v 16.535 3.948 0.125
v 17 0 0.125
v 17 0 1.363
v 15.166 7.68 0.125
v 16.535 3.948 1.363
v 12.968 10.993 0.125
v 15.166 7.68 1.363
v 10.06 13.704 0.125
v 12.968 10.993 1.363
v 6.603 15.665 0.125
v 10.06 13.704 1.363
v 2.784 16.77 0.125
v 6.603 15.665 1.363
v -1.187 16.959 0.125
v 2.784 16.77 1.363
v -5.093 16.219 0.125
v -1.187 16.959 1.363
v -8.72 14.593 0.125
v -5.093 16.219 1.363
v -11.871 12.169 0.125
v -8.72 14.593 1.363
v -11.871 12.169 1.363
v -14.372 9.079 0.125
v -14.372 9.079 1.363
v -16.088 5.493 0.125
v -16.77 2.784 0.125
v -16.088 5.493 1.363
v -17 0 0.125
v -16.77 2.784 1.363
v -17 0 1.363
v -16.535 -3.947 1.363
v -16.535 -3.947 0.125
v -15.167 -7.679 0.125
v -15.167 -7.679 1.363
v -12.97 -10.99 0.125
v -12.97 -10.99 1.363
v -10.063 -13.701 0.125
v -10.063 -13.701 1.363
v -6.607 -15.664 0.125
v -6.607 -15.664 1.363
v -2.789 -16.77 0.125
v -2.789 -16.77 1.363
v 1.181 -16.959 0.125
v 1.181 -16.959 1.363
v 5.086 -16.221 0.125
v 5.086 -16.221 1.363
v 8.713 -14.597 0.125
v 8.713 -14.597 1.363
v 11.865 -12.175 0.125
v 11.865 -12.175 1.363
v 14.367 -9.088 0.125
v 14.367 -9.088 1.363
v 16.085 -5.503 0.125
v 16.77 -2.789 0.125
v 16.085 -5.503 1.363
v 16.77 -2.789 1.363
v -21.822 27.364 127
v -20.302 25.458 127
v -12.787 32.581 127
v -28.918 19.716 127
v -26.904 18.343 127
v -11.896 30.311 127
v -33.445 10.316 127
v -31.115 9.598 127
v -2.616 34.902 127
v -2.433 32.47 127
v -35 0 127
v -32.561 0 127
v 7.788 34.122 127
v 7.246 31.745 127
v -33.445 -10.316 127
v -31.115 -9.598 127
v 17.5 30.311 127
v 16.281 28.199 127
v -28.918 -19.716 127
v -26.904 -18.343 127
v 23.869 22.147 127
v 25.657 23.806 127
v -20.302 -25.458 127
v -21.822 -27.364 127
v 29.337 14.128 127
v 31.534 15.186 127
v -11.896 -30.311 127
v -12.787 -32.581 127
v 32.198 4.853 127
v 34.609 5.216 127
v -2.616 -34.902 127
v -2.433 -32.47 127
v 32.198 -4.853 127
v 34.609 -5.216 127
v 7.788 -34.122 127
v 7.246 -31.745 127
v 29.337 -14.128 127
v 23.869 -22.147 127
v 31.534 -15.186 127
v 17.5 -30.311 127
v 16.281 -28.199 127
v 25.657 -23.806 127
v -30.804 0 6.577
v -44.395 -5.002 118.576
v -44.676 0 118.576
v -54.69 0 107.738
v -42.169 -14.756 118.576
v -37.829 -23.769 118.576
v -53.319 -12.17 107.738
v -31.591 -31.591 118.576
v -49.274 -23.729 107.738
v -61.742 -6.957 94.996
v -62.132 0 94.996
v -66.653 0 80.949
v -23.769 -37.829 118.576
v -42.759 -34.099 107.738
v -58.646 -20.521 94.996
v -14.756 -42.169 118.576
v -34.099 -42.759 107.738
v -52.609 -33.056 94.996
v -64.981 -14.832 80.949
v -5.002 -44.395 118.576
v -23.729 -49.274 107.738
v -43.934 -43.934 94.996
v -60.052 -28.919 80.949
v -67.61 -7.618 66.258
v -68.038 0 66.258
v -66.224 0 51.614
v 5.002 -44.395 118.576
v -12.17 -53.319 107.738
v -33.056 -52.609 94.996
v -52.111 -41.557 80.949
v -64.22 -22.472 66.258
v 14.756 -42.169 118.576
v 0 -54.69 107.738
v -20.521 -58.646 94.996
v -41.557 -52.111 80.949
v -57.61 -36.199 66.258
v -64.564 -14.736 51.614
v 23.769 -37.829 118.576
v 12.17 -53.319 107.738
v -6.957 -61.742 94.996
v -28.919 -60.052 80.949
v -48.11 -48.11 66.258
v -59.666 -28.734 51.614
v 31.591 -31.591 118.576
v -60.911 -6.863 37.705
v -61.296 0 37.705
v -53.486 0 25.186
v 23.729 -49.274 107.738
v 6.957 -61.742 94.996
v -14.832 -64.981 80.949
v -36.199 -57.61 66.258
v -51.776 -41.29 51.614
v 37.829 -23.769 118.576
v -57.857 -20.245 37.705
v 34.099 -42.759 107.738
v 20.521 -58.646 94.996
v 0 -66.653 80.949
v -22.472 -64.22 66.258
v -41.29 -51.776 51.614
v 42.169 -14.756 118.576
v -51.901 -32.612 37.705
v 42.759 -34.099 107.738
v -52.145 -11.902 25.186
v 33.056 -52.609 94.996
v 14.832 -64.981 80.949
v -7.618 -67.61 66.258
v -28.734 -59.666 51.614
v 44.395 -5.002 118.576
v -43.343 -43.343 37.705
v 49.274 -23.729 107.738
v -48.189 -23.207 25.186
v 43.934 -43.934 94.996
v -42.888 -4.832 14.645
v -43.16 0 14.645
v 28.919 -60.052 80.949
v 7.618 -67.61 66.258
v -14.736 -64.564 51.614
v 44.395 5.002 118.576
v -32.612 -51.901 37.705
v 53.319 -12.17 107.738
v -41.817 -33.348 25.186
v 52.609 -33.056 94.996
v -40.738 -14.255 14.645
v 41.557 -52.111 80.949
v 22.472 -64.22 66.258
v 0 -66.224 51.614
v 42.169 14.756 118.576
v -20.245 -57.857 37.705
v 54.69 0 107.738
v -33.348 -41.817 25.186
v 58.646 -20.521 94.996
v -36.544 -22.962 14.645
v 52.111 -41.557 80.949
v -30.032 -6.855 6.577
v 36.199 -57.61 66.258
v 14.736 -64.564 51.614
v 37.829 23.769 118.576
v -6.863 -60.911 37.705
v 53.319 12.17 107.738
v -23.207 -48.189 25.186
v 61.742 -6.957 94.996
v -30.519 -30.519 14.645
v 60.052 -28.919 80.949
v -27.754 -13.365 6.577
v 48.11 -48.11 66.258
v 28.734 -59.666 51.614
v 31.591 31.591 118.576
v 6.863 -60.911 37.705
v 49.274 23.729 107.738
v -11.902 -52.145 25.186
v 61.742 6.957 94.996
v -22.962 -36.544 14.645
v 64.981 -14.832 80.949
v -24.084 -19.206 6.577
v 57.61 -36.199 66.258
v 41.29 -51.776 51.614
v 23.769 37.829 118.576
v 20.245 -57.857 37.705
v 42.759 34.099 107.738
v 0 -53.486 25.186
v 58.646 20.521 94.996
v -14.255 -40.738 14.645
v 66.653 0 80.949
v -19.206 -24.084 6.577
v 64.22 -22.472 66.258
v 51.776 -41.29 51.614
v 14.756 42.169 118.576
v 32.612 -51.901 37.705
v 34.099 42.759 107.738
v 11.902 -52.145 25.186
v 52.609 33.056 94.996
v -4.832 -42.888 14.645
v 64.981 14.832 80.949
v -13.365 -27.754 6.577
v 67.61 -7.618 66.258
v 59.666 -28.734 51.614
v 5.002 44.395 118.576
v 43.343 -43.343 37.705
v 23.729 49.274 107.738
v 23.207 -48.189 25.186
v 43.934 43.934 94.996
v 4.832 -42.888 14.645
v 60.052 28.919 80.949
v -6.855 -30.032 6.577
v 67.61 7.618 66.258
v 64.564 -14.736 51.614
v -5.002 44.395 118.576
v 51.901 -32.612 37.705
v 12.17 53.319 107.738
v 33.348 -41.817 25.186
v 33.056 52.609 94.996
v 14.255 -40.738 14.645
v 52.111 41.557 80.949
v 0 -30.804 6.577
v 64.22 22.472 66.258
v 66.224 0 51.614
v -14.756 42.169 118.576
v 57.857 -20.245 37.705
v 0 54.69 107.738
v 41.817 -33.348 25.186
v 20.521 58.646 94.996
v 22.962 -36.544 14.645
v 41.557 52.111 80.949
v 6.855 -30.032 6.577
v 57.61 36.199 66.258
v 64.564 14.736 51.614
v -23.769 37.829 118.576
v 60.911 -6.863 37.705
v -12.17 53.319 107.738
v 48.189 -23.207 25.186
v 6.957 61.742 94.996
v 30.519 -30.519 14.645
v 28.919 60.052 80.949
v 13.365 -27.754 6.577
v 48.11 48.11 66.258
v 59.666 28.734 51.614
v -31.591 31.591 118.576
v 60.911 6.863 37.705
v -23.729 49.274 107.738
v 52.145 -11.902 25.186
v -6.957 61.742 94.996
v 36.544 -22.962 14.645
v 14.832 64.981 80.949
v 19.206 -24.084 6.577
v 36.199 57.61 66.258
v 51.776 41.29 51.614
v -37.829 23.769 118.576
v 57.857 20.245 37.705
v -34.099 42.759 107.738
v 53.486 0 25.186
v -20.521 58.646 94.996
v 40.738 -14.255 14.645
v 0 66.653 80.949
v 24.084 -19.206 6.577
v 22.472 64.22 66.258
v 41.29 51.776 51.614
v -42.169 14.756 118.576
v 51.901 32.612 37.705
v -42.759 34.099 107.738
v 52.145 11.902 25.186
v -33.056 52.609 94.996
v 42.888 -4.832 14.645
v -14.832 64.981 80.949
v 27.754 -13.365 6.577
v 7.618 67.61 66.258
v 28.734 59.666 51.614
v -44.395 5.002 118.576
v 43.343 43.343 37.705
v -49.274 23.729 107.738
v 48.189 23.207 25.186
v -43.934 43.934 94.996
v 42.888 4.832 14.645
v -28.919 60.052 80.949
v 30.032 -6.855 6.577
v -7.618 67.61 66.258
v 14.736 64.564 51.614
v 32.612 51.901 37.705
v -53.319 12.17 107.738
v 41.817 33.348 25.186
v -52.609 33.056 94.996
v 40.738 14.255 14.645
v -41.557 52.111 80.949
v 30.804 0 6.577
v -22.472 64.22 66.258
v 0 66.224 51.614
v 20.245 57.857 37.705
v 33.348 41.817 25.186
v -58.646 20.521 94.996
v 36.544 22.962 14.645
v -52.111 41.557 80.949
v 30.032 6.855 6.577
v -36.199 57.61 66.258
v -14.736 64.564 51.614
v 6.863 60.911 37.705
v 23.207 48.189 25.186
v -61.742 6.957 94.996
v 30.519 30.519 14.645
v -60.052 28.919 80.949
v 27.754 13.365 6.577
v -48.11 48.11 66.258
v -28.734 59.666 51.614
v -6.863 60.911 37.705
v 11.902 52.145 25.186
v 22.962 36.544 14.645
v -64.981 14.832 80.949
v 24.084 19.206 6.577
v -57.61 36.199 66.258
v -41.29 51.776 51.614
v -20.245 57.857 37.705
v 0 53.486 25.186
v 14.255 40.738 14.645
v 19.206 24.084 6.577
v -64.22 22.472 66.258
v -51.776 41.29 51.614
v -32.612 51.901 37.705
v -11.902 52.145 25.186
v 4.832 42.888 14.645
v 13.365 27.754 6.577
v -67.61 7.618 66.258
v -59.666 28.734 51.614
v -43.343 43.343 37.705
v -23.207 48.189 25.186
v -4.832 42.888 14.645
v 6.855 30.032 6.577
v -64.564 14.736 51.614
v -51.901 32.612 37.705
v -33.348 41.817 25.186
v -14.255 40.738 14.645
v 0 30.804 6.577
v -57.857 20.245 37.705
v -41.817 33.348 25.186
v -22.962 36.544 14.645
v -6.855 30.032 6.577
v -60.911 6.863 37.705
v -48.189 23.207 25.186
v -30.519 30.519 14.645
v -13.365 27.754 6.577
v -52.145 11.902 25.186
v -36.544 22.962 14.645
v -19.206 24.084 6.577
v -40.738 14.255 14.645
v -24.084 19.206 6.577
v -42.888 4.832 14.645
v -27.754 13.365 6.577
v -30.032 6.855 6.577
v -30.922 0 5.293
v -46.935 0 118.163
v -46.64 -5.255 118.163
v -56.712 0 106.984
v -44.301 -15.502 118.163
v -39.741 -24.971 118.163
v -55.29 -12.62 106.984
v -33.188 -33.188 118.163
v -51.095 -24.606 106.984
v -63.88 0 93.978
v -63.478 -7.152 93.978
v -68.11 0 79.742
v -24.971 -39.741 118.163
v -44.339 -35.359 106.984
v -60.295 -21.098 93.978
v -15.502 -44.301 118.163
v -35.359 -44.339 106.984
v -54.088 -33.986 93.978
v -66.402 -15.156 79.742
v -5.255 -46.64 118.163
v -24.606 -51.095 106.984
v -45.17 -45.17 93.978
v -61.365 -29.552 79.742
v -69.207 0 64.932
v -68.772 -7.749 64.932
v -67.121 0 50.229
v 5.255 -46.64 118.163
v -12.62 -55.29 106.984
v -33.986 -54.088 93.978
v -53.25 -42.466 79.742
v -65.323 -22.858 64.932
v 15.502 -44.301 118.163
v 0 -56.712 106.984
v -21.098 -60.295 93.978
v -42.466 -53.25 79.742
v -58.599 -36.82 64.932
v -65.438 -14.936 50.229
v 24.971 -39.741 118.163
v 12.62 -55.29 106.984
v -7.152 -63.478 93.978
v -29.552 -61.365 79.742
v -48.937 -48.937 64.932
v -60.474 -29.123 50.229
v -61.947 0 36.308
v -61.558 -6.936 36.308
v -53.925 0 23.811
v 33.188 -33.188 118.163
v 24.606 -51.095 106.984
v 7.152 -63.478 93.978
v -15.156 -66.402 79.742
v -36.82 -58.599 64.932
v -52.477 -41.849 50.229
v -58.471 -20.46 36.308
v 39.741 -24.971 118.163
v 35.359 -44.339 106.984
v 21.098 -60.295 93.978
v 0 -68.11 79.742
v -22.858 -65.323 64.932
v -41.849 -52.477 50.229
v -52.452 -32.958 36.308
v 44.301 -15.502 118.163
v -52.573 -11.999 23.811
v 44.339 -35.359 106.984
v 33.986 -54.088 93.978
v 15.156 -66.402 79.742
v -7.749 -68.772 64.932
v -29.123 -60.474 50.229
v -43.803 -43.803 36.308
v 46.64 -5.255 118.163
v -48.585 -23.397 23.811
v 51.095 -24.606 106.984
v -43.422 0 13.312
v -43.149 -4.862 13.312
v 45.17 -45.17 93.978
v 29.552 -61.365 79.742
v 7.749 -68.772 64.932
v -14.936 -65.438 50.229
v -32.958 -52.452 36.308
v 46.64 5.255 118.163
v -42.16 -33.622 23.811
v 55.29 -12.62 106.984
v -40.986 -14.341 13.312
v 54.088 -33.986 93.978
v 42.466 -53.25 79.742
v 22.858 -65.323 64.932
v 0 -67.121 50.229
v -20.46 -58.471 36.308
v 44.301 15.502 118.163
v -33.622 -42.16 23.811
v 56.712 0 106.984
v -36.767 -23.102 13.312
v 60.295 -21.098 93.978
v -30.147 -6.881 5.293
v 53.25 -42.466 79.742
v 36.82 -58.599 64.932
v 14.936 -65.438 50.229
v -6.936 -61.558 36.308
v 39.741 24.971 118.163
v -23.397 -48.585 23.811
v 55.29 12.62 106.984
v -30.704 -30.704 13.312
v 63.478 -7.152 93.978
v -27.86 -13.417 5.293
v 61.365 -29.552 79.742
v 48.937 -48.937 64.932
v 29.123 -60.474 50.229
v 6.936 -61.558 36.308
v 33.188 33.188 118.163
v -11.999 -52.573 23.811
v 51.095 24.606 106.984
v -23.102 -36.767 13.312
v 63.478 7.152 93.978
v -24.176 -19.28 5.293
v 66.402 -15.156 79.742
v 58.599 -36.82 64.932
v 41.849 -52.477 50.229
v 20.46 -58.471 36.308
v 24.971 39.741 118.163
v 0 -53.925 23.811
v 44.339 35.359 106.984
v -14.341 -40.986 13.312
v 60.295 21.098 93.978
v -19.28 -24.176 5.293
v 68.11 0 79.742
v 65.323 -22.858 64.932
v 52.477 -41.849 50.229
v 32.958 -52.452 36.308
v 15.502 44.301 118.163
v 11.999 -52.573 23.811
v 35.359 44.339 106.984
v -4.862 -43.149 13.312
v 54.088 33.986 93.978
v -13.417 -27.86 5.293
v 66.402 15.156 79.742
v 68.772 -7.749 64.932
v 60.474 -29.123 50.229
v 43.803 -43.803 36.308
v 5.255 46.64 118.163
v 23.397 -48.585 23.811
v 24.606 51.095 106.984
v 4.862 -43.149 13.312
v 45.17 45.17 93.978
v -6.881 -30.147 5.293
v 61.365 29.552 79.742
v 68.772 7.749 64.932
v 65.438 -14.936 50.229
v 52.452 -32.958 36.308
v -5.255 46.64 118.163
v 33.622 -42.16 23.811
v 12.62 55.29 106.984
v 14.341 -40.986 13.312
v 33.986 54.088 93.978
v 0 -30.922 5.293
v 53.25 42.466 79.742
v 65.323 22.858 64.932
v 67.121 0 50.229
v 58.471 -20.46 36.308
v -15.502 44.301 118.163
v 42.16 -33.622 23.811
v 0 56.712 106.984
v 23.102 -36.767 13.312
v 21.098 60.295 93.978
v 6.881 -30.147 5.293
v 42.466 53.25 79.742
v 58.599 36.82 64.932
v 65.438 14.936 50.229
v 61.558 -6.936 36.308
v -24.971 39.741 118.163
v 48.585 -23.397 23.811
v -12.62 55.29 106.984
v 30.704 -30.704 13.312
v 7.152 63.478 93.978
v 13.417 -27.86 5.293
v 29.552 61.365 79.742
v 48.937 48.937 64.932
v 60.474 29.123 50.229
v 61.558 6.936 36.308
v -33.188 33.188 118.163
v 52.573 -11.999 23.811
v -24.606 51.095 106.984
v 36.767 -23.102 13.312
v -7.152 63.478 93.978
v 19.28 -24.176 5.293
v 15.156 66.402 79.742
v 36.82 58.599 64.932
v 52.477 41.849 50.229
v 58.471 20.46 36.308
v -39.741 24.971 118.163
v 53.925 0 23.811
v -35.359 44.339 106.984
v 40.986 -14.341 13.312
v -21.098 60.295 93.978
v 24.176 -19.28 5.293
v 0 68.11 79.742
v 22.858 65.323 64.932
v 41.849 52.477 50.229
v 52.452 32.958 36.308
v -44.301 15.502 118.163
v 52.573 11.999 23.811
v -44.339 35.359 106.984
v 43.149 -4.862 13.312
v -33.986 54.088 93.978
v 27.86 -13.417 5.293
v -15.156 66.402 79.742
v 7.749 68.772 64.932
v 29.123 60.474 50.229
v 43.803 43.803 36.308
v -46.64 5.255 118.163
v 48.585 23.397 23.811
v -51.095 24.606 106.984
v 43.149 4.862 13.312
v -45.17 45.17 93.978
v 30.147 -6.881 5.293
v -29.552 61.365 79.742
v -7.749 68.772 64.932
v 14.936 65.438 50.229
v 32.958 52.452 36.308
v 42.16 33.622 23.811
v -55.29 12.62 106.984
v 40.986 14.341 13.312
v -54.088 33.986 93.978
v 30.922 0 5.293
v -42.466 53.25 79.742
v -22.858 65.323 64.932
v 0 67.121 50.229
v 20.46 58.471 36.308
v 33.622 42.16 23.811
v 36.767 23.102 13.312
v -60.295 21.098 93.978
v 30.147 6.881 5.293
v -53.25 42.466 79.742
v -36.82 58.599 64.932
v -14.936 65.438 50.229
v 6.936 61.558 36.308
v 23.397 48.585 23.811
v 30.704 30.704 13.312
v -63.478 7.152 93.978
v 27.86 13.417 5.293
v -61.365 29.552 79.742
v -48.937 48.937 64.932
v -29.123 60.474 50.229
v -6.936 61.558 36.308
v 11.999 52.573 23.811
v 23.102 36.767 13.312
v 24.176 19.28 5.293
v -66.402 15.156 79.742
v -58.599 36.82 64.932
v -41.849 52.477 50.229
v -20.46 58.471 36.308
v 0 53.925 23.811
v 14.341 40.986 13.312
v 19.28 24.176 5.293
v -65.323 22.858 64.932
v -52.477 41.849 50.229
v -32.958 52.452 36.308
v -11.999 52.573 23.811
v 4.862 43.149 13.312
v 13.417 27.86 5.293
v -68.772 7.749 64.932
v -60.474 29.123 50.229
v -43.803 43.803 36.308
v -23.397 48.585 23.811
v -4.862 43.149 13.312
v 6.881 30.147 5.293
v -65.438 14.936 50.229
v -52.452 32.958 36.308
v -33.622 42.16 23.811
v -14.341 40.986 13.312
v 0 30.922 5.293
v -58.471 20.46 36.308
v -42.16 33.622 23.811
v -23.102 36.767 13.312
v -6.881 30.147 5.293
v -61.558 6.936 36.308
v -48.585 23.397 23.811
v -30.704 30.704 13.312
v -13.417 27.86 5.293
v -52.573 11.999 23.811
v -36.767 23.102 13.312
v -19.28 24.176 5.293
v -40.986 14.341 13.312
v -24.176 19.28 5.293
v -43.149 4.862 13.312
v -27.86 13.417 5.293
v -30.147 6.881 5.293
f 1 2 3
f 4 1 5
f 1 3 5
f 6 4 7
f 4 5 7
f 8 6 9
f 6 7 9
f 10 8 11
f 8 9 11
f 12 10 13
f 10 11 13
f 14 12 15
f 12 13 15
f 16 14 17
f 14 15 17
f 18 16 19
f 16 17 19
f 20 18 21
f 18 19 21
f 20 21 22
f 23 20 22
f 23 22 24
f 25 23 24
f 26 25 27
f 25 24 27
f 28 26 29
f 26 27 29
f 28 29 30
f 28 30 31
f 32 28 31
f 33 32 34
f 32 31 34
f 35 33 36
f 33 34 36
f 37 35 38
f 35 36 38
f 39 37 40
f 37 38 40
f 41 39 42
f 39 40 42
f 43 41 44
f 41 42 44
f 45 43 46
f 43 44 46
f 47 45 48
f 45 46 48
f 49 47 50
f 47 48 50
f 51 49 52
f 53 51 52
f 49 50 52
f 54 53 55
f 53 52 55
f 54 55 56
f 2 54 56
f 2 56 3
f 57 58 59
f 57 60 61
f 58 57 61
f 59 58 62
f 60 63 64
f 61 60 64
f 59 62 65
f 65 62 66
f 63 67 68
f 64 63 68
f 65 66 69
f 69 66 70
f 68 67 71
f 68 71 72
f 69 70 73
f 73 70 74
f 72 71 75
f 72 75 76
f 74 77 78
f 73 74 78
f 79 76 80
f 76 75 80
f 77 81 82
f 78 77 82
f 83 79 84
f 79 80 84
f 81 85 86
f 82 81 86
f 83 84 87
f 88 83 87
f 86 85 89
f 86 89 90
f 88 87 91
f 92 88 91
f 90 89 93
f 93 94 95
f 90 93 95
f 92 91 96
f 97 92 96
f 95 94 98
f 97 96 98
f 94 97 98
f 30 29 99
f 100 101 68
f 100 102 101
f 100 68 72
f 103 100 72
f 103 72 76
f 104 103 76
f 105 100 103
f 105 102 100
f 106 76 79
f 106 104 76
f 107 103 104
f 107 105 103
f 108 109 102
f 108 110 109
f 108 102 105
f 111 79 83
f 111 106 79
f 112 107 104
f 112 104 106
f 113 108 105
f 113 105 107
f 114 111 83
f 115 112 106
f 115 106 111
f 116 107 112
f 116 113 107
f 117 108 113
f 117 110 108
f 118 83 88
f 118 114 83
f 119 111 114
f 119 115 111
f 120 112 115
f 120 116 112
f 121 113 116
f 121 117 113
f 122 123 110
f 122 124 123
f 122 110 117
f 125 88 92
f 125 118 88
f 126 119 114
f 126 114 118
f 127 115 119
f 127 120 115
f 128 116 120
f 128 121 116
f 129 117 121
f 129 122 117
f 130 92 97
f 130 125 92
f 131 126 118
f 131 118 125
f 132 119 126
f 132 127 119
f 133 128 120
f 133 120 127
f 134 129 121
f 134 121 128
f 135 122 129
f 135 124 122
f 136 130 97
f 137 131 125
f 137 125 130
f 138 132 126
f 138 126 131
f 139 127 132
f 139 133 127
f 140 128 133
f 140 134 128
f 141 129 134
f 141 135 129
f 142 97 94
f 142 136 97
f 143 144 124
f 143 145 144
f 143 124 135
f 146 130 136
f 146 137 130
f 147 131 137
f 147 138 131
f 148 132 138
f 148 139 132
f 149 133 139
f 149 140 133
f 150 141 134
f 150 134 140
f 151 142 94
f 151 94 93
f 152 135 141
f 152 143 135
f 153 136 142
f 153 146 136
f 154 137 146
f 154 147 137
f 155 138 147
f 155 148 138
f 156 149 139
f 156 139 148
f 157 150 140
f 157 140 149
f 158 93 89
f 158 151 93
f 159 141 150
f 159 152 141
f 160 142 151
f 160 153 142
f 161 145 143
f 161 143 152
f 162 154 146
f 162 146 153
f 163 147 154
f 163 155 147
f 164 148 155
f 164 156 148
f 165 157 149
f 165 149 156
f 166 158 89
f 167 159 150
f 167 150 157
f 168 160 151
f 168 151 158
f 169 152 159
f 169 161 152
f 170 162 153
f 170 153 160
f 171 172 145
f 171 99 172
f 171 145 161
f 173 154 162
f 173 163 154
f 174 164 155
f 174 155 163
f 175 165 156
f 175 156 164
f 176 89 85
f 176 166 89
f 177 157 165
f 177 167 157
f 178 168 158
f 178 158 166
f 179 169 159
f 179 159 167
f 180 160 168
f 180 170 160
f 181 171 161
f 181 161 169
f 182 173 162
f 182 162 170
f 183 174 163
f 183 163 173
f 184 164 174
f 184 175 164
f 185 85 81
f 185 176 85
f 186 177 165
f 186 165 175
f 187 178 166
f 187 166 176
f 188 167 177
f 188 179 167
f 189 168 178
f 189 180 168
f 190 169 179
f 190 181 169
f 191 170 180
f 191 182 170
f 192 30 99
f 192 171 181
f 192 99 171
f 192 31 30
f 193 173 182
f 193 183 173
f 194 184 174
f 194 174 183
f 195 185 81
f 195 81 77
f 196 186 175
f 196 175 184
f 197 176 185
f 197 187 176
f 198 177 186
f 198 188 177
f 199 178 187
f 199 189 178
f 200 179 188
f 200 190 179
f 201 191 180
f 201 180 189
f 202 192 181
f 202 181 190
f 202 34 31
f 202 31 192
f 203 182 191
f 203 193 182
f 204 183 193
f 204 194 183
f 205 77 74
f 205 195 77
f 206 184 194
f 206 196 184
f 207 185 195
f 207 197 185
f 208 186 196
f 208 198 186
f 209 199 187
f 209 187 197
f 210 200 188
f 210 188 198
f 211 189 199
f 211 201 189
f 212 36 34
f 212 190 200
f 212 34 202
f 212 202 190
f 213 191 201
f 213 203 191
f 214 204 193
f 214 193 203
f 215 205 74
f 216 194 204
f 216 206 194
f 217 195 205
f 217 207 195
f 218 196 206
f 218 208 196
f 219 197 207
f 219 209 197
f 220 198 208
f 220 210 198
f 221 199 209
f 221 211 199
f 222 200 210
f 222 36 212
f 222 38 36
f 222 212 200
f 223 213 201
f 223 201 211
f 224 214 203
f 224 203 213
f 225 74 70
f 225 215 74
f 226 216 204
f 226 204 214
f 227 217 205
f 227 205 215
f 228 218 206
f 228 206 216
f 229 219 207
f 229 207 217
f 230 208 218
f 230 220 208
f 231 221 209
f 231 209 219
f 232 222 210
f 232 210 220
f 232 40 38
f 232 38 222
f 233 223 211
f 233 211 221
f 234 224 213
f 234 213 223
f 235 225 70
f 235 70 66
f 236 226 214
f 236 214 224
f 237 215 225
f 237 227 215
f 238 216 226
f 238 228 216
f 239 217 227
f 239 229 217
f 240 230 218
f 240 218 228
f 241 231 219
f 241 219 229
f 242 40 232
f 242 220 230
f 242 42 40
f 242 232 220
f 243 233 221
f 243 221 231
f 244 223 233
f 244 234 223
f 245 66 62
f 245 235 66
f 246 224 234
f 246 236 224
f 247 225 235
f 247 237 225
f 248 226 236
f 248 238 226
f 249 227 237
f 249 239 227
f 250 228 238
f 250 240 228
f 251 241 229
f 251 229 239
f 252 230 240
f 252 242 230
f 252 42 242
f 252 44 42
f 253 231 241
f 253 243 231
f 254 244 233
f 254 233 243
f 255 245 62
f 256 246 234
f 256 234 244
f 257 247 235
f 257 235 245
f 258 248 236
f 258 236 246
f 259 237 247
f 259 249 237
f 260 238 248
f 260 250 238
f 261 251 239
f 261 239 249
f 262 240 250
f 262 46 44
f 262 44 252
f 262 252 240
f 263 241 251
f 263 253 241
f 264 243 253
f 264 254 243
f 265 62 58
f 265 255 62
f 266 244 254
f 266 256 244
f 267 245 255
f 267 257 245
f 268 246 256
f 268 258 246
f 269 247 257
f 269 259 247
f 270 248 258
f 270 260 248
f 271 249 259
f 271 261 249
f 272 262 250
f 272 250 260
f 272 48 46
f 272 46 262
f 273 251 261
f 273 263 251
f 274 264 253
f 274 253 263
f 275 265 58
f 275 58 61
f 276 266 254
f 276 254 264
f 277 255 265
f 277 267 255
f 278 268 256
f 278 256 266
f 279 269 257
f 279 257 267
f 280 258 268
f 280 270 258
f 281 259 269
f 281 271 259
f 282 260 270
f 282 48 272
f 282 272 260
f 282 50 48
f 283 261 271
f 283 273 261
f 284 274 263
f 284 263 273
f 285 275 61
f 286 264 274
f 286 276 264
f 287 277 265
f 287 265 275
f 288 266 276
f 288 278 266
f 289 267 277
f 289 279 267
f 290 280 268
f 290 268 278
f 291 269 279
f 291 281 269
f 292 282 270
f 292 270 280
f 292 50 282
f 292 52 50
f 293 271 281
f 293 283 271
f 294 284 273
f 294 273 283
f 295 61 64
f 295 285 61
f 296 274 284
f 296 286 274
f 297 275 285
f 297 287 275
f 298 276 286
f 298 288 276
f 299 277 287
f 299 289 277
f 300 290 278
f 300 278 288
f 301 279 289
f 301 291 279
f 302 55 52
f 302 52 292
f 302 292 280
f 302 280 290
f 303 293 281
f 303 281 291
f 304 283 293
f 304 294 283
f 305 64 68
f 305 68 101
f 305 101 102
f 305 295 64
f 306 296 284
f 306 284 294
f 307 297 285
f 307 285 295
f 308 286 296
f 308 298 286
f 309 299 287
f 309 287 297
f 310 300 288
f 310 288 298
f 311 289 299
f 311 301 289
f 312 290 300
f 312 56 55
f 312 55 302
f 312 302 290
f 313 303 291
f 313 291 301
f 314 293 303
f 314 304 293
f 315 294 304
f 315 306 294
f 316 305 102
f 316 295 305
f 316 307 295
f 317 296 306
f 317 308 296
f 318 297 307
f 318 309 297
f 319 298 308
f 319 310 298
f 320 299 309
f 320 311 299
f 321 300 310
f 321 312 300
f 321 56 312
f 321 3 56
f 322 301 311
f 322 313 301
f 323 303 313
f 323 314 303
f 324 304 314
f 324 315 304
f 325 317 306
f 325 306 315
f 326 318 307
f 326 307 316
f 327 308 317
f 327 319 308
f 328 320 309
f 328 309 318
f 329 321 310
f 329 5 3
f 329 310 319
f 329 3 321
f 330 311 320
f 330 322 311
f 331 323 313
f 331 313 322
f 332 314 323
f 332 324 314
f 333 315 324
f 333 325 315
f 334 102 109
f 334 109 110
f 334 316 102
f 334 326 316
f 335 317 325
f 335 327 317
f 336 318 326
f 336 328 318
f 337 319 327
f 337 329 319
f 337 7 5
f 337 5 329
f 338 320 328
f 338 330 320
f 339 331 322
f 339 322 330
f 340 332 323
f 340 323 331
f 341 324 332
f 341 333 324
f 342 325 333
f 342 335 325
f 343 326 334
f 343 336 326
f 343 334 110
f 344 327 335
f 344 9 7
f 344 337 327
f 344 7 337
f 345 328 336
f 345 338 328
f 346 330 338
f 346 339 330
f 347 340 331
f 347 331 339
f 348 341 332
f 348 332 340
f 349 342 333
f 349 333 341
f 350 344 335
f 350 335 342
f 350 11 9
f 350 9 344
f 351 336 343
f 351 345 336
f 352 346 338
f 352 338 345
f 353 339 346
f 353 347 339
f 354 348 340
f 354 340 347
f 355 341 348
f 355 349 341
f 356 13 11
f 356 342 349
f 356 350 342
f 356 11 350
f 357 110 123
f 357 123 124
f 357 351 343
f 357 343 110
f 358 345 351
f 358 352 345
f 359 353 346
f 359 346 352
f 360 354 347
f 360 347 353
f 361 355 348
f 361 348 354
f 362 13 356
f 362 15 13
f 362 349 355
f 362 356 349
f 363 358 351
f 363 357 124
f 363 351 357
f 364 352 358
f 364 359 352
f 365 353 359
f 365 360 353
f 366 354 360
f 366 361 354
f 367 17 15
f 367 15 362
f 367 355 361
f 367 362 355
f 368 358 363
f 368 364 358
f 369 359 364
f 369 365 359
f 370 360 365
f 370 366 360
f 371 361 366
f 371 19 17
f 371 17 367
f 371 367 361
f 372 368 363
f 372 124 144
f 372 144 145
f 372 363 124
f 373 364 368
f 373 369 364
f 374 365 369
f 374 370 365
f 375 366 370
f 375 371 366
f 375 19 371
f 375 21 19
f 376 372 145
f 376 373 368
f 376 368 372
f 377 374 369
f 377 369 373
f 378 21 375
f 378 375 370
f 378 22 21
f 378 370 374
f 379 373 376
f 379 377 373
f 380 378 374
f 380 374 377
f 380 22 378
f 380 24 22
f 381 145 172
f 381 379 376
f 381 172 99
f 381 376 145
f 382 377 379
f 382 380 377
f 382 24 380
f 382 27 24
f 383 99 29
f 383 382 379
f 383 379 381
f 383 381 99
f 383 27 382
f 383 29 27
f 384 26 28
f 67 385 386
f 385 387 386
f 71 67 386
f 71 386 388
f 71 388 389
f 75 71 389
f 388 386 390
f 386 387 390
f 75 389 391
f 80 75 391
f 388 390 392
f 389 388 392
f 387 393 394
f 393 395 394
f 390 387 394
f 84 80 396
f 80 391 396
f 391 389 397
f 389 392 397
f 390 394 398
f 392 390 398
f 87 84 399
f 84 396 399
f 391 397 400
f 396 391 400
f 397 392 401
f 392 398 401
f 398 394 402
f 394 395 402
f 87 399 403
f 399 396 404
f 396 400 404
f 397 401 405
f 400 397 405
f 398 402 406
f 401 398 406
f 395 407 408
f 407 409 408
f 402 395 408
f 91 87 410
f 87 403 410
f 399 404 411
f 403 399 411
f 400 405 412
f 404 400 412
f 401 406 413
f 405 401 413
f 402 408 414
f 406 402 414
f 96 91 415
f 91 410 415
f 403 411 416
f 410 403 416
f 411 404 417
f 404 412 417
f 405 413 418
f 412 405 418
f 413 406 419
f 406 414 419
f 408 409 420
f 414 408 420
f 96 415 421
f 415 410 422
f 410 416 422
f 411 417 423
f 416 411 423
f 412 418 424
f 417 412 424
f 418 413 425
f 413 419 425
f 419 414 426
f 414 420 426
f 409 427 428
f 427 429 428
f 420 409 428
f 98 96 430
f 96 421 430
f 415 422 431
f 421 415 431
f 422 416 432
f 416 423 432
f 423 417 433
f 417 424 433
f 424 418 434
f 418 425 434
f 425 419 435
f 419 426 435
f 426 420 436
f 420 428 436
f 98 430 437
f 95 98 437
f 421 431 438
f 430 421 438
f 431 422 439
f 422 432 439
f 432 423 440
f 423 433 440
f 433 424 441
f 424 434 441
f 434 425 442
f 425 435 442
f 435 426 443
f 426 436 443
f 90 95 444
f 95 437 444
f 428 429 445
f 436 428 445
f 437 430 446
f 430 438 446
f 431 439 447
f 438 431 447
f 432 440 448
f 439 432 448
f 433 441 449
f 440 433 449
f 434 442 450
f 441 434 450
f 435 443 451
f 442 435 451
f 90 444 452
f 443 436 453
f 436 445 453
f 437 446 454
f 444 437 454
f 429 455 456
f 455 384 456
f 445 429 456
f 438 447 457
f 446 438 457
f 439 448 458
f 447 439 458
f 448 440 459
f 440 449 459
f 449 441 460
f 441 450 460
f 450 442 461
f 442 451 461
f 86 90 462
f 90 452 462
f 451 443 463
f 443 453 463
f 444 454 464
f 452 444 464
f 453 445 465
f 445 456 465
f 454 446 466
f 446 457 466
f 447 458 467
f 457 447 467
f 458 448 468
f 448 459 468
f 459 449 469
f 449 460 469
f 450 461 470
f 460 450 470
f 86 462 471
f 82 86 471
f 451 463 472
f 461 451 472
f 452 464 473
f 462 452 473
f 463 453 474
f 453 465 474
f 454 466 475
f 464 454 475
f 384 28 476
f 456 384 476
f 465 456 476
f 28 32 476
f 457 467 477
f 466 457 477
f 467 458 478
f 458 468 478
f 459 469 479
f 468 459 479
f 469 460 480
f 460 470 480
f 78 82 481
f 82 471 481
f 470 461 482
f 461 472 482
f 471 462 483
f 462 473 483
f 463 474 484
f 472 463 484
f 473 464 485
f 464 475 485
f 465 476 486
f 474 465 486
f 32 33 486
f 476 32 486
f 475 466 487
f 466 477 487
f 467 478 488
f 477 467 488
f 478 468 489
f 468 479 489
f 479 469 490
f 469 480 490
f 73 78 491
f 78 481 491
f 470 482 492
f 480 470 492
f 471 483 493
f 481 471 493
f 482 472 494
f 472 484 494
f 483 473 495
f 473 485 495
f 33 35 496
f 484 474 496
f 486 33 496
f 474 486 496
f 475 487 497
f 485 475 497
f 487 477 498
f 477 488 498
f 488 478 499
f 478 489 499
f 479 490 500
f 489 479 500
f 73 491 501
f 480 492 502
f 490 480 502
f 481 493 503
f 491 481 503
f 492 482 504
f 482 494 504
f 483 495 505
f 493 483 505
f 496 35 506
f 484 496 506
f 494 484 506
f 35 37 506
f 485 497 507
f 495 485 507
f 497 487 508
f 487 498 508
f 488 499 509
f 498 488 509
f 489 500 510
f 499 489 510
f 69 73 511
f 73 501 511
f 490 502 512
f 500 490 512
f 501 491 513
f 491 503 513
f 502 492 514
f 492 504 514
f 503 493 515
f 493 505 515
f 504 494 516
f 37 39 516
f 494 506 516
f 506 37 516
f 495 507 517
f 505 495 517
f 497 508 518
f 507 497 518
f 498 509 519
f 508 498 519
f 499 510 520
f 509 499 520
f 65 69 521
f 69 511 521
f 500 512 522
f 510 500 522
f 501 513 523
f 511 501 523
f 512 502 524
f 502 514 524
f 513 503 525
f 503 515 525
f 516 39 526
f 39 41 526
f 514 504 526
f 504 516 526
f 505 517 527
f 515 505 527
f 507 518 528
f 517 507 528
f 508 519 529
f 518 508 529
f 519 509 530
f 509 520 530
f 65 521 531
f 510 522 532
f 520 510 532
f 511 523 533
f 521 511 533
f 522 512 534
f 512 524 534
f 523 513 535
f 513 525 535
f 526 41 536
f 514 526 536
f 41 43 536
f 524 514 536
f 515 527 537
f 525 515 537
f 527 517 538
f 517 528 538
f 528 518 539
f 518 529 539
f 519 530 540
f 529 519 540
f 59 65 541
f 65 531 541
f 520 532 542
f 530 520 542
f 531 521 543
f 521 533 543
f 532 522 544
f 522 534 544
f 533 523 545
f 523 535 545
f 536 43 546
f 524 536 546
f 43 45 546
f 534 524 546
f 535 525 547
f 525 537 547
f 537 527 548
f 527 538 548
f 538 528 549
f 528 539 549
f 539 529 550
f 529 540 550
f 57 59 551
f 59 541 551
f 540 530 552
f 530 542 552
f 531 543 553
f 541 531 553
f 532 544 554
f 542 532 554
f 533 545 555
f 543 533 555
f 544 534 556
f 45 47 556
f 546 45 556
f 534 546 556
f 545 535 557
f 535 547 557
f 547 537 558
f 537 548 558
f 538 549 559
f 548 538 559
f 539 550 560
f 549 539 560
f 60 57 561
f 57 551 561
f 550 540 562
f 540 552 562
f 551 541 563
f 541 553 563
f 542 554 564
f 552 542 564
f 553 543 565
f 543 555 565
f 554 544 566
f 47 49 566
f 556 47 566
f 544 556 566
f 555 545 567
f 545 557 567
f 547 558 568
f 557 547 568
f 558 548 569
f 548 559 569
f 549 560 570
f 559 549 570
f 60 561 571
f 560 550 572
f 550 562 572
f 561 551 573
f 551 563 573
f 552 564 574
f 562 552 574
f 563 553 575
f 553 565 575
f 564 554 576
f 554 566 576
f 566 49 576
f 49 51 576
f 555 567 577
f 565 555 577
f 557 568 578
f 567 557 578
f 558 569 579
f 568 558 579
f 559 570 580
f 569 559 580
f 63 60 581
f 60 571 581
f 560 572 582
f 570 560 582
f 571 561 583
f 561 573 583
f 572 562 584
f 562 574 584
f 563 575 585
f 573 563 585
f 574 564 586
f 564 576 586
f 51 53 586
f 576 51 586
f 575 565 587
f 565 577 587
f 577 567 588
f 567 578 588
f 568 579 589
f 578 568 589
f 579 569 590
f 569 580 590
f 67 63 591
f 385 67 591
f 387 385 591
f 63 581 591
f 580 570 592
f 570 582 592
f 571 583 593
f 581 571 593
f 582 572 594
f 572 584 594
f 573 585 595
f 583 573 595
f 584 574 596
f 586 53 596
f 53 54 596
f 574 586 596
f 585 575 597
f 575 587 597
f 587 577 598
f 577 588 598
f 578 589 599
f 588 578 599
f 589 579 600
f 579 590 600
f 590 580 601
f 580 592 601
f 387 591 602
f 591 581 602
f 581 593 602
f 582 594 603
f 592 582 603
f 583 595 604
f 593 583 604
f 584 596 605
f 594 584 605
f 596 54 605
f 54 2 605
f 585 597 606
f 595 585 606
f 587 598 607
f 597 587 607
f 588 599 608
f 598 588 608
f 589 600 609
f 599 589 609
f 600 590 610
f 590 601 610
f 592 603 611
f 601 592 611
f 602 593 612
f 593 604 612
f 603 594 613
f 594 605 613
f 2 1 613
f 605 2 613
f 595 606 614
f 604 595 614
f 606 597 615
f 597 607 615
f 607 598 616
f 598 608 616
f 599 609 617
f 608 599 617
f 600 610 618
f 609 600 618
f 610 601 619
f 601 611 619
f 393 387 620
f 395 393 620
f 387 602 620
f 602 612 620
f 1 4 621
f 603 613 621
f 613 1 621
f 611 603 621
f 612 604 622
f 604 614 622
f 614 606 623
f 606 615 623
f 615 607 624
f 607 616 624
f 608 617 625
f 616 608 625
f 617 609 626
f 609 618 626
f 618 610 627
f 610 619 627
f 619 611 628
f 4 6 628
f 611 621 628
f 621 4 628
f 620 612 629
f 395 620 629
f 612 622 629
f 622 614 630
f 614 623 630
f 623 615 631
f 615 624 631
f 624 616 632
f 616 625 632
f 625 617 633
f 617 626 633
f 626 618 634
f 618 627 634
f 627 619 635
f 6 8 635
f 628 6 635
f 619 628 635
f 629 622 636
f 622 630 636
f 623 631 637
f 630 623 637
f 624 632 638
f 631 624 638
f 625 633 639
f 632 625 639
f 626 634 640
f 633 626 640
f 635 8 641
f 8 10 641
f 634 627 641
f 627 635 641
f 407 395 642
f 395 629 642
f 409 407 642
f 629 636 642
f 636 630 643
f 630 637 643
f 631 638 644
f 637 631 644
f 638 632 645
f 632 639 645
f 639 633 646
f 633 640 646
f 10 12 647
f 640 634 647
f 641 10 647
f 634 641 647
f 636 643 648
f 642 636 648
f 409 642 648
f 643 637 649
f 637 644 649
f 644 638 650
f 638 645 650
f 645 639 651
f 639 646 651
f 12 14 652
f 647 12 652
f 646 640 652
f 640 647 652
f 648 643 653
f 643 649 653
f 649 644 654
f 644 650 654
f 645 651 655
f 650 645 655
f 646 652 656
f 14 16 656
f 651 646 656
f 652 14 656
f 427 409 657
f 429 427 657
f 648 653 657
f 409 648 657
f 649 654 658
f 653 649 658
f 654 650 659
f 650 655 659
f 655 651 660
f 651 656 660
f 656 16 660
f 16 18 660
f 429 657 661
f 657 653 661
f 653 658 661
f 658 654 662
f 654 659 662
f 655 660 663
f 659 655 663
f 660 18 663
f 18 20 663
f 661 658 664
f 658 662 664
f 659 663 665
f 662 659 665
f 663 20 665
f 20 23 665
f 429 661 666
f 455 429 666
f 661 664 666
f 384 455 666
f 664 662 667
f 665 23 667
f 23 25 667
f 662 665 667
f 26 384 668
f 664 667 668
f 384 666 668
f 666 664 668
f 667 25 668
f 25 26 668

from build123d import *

# Parameters (mm, degrees)
F2_T          = -1.2
F3_R          = 17
F4_DEPTH      = 25
F4_DEPTH_BACK = 25


with BuildPart() as f1:
    # F0 (on Front) → F1 (revolve)
    with BuildSketch(Plane.XZ):
        with BuildLine():
            Line((-16.5, 0), (0, 0))
            Line((0, 0), (0, 127))
            Line((0, 127), (-35, 127))
            ThreePointArc((-35, 127), (-68.5223503683, 57.269382033), (-16.5, 0))
        make_face()
    revolve(axis=Axis((0, 0, 63.5), (0, 0, 1)))

    # F2
    f2_openings = [f1.faces().sort_by_distance(p)[0] for p in [
        (0, 0, 127),
    ]]
    offset(amount=F2_T, openings=f2_openings)

    # F3 (on face) → F4 (cut, two sides)
    with BuildSketch(Plane.XY.offset(1.2)) as f4_sk:
        Circle(F3_R)
    extrude(amount=-F4_DEPTH, mode=Mode.SUBTRACT)
    extrude(f4_sk.sketch, amount=F4_DEPTH_BACK, mode=Mode.SUBTRACT)


solid = f1.part
